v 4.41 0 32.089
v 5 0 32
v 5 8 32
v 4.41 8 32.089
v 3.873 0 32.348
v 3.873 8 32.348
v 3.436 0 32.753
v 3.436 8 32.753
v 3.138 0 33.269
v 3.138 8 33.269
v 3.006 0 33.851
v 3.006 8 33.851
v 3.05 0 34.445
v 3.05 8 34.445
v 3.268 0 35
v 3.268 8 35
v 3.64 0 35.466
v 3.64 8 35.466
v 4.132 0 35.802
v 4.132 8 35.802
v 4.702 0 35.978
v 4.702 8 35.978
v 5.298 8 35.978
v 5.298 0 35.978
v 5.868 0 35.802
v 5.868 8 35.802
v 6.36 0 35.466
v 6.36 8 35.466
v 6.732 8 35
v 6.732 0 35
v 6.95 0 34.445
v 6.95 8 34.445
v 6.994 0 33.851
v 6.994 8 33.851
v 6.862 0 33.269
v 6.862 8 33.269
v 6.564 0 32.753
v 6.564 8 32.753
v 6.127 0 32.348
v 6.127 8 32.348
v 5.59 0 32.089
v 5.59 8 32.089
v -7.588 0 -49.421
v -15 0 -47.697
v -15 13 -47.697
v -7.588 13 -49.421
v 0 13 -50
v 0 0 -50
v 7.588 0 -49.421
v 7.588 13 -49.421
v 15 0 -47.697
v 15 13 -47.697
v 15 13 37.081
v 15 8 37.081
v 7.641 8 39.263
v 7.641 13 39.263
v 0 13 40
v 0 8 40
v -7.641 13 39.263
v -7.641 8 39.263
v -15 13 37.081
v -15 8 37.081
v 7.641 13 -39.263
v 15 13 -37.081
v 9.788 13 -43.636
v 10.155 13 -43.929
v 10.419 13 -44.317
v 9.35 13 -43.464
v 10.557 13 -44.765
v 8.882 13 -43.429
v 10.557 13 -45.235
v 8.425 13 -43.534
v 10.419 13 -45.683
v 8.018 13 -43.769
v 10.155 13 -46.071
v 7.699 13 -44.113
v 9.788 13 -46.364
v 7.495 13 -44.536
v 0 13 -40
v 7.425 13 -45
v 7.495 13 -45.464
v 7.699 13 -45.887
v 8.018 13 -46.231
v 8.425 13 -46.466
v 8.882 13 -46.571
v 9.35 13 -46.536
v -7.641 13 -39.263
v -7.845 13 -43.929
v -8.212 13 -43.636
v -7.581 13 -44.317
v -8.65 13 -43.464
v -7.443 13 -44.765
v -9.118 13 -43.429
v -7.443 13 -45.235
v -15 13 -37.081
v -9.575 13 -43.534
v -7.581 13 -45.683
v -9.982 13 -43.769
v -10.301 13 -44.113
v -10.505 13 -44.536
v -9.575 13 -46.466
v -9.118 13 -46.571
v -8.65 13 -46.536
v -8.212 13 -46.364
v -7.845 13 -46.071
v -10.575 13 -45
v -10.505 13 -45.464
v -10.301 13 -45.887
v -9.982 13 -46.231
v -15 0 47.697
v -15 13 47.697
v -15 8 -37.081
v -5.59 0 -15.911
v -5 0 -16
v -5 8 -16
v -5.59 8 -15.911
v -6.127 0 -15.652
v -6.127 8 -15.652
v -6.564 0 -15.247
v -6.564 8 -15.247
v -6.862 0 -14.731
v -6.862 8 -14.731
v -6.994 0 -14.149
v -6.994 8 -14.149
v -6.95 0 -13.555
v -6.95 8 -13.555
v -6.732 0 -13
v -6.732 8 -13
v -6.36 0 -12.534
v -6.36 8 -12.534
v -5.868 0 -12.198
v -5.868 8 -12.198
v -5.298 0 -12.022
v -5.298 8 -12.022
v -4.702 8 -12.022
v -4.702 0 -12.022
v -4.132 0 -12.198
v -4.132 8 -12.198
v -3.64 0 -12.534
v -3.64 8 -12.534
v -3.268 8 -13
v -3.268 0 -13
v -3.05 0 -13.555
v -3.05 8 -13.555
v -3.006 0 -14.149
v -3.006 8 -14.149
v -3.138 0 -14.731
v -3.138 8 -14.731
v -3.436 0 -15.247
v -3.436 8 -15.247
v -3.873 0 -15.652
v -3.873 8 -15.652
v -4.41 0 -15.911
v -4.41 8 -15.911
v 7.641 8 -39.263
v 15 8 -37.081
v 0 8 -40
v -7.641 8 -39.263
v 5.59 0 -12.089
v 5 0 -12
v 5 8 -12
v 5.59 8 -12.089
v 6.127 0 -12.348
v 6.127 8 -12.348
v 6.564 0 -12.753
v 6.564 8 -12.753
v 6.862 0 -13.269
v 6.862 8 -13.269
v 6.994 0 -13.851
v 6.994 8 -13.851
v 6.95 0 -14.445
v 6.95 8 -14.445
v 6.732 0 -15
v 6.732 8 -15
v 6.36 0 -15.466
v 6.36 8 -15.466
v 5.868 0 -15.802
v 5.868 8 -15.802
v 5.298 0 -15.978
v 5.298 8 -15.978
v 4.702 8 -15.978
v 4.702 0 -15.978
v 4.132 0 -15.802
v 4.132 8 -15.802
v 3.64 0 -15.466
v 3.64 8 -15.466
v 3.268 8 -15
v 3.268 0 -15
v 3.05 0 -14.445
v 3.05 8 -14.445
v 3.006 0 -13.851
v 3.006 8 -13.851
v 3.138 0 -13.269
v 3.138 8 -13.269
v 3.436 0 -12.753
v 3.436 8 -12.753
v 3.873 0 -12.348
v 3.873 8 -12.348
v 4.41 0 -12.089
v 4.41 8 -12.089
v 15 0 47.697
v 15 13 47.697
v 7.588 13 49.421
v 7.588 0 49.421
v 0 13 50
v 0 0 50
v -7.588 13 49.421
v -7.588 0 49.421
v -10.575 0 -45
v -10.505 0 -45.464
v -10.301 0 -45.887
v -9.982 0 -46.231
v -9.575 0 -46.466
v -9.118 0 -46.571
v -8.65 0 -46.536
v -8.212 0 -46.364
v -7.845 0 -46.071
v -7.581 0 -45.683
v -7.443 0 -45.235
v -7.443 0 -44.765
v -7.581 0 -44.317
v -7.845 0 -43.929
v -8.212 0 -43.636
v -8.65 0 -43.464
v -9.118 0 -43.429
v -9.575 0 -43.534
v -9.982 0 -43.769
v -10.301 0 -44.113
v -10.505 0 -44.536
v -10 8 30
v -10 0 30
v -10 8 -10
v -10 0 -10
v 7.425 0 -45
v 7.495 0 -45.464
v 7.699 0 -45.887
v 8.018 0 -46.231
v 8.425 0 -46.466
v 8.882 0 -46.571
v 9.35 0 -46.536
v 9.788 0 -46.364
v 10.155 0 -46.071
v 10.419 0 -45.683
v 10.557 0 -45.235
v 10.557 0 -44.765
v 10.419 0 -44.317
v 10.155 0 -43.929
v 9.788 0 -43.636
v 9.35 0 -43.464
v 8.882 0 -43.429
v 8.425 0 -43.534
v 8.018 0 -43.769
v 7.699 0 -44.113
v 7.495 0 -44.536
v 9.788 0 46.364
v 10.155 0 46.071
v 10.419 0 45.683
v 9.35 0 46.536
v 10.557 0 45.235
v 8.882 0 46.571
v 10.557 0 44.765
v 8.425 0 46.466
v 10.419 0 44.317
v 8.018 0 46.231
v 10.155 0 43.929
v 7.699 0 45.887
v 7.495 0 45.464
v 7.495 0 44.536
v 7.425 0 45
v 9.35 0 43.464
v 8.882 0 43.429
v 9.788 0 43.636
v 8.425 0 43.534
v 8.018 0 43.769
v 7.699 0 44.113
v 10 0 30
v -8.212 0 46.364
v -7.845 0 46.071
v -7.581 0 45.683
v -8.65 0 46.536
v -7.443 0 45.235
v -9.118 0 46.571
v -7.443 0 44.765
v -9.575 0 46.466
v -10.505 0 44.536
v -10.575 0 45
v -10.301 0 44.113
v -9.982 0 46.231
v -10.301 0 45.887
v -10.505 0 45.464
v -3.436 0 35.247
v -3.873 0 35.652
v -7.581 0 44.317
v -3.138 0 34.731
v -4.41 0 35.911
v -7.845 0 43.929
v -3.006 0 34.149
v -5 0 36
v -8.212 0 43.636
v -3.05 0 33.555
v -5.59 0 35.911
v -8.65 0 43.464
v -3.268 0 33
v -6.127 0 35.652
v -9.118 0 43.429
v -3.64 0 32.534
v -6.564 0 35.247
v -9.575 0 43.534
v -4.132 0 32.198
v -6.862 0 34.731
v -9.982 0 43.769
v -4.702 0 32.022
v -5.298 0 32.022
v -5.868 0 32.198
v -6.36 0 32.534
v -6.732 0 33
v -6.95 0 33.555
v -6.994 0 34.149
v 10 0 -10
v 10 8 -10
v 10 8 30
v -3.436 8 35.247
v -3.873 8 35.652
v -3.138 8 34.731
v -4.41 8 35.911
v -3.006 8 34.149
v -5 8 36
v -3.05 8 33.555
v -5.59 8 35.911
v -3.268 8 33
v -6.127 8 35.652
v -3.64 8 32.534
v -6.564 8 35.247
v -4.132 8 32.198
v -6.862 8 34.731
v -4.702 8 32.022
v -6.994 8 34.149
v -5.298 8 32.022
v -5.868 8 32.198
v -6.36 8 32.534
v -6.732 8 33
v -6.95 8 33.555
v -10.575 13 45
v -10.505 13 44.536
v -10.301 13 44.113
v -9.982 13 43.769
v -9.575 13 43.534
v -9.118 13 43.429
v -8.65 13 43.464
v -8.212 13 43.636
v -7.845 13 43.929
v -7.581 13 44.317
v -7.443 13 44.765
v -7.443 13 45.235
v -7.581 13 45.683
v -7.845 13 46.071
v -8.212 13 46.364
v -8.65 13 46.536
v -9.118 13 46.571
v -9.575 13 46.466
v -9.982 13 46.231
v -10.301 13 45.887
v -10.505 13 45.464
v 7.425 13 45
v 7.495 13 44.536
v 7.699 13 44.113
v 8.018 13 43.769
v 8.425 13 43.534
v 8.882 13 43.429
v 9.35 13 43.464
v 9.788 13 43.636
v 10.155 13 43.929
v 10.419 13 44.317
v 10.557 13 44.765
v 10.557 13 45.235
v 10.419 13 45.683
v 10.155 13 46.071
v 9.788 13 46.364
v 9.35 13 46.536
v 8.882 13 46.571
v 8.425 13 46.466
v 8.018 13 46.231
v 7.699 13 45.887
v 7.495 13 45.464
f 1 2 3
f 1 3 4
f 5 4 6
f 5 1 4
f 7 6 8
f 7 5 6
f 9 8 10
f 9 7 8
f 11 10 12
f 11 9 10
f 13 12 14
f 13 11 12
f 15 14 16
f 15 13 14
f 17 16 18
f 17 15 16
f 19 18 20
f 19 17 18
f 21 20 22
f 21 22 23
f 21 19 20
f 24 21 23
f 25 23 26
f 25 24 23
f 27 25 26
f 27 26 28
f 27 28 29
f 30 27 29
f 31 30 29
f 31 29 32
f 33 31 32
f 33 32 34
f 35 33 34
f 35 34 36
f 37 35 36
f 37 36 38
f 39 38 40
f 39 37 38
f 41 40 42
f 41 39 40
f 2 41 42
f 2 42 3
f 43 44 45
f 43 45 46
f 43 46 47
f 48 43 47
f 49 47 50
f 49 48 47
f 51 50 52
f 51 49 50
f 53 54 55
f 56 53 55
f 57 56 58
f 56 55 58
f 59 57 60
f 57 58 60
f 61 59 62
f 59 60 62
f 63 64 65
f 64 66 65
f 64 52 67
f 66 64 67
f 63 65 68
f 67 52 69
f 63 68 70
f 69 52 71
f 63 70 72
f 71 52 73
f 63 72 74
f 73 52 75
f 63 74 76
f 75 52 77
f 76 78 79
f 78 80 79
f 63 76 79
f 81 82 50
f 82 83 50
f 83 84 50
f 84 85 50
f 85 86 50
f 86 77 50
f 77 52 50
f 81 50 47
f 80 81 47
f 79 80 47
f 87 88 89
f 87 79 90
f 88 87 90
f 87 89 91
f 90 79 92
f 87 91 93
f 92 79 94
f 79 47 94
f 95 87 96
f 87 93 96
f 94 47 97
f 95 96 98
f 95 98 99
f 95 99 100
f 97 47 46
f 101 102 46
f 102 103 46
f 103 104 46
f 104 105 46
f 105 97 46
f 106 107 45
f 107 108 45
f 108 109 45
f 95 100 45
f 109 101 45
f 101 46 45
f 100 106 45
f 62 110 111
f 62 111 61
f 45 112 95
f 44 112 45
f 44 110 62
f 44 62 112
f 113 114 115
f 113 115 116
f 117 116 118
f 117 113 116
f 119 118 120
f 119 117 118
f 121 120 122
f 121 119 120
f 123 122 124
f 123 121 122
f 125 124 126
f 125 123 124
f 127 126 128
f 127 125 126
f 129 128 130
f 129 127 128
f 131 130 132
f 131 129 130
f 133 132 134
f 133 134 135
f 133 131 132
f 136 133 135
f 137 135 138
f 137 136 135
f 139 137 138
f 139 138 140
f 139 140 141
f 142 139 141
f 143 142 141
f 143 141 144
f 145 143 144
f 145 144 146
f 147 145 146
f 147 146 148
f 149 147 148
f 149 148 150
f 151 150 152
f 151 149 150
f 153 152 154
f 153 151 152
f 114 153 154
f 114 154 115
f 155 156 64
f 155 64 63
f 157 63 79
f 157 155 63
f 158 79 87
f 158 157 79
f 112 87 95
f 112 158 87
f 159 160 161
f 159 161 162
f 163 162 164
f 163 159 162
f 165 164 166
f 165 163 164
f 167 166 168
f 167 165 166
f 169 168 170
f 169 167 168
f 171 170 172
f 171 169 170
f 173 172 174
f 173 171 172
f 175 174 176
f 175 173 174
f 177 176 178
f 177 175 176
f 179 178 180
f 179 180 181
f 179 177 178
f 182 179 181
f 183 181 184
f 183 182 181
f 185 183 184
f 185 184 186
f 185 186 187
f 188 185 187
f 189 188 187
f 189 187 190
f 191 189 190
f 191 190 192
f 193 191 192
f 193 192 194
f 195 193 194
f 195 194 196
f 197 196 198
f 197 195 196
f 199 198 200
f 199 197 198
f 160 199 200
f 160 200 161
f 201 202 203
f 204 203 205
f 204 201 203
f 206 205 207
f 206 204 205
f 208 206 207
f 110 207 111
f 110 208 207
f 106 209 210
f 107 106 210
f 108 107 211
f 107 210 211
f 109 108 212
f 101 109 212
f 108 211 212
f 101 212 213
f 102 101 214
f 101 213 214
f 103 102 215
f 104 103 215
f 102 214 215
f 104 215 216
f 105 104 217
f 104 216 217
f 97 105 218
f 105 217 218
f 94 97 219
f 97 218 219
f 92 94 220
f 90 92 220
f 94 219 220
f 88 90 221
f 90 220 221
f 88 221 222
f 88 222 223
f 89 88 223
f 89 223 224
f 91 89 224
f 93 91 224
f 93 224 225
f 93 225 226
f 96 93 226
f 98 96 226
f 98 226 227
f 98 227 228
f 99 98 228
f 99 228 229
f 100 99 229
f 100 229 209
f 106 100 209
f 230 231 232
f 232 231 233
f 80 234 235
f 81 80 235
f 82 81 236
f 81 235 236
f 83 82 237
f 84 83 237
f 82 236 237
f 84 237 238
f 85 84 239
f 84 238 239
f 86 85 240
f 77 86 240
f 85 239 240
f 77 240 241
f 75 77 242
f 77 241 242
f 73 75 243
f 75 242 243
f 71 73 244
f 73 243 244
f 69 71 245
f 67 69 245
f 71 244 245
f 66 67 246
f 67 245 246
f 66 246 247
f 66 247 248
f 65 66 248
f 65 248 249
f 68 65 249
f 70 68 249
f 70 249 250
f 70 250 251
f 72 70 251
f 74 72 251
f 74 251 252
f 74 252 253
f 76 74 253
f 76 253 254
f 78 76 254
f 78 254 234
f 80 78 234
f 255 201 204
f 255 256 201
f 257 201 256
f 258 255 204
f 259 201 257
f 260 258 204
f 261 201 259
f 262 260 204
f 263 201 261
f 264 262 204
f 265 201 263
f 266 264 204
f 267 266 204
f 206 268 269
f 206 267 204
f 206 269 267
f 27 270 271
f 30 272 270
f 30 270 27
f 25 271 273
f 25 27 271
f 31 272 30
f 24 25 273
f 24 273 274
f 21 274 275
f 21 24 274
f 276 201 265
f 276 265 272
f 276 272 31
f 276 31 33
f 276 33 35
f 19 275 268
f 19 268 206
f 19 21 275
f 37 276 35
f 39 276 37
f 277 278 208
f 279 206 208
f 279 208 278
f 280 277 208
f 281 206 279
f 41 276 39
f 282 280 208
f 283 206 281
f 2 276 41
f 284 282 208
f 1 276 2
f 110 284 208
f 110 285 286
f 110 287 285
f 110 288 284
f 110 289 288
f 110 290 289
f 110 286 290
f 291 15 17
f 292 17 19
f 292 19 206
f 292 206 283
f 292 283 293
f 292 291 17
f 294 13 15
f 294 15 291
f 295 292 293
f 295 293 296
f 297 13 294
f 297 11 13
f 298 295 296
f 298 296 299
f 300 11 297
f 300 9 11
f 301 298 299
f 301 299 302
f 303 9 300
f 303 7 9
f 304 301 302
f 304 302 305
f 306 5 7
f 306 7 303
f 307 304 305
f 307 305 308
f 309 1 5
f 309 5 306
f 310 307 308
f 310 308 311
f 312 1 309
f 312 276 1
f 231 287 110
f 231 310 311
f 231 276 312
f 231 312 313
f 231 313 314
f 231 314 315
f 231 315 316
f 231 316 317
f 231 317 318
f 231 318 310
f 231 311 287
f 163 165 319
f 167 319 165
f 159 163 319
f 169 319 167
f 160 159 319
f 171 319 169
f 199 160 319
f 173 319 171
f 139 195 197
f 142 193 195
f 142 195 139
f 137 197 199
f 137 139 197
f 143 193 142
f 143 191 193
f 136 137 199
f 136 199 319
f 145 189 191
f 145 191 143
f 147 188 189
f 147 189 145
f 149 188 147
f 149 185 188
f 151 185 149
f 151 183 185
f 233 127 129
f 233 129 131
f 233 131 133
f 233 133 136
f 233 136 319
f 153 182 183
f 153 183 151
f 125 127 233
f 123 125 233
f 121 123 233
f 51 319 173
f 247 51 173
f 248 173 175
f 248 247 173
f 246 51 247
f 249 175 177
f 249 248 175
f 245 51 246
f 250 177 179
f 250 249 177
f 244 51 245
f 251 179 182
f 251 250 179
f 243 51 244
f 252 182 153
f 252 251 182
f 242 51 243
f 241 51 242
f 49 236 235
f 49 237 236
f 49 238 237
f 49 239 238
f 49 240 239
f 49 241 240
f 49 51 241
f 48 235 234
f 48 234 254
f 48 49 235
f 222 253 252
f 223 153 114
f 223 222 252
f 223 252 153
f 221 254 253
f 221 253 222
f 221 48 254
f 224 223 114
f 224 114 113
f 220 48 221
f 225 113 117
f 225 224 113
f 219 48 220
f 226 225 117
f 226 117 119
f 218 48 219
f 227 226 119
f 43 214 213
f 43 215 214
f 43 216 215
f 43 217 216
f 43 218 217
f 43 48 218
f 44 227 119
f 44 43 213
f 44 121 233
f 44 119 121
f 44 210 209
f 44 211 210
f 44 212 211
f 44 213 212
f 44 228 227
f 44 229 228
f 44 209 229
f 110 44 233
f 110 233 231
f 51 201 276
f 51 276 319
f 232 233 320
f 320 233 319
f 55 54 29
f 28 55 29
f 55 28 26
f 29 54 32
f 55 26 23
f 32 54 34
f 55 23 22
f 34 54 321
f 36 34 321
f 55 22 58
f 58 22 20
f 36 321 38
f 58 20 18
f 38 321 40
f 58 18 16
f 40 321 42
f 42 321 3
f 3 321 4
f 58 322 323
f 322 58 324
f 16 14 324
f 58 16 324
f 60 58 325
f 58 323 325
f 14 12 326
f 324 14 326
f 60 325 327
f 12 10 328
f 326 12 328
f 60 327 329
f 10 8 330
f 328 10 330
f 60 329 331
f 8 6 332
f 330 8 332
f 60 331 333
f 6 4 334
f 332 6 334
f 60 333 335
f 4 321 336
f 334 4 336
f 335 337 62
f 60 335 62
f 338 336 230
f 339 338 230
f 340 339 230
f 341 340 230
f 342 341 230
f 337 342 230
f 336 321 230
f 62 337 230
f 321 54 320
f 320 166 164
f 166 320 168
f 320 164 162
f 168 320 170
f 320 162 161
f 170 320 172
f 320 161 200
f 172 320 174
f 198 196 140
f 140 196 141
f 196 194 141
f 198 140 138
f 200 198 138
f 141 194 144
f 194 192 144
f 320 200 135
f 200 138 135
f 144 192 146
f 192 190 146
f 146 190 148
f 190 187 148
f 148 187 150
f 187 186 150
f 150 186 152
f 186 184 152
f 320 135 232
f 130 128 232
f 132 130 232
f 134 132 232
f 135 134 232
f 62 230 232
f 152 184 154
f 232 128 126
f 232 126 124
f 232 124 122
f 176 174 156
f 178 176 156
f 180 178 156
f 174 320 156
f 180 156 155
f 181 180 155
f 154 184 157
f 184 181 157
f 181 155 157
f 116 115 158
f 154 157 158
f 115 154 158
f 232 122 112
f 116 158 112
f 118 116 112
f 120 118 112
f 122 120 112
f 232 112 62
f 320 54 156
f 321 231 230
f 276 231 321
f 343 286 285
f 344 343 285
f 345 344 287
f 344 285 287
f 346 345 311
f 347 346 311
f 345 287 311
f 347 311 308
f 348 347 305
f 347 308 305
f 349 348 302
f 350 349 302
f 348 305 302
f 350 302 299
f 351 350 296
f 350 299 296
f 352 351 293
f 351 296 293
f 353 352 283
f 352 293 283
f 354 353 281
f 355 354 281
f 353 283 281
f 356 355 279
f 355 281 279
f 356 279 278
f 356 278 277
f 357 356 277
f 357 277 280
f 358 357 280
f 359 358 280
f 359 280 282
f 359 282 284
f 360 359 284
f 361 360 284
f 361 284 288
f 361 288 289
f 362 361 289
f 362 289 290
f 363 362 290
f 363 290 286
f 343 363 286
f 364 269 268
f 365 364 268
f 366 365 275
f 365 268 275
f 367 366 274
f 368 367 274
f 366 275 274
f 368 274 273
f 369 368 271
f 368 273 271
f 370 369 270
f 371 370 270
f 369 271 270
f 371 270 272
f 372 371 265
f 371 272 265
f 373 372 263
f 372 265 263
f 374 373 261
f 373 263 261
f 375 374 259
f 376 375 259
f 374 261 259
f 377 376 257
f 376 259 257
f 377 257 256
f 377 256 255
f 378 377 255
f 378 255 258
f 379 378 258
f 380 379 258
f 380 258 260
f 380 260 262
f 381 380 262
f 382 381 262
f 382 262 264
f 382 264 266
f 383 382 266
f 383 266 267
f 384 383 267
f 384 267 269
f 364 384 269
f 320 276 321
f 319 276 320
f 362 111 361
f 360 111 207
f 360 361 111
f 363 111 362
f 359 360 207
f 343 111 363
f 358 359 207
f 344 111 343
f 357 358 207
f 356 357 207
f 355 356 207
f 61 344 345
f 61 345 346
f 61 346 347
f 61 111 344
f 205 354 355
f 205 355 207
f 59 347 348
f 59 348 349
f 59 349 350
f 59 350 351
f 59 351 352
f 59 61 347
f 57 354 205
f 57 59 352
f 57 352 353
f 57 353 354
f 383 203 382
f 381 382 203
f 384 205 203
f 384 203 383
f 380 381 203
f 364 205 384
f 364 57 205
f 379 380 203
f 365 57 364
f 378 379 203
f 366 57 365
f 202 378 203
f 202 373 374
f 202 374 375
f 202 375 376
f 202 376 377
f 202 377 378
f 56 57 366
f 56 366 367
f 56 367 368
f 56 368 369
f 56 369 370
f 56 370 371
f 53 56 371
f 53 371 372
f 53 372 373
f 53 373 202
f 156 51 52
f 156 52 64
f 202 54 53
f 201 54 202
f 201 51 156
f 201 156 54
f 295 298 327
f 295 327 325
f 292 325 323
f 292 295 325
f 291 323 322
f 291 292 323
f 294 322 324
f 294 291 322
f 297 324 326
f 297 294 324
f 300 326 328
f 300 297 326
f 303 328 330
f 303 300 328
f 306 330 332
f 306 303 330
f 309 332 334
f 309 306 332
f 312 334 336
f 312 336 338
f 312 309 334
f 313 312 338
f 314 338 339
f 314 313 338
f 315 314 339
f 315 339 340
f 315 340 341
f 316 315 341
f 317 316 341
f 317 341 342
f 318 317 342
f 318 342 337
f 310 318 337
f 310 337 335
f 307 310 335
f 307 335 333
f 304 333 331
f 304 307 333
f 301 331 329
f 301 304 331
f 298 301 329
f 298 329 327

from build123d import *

# Parameters (mm, degrees)
SKETCH_1_R                  = 2
SKETCH_1_W                  = 20
SKETCH_1_H                  = 40
EXTRUDE_1_DEPTH             = 8
EXTRUDE_2_DEPTH             = 5
HOLE_WIZARD_M31_D           = 3.15
PATTERN_LINEAR_1_COUNT      = 2
PATTERN_LINEAR_1_PITCH      = 18
PATTERN_LINEAR_1_COUNT_DIR2 = 2
PATTERN_LINEAR_1_PITCH_DIR2 = 90


with BuildPart() as part:
    # Эскиз1 → Бобышка-Вытянуть1 (new body)
    with BuildSketch(Plane(origin=(0, 0, 0), x_dir=(1, 0, 0), z_dir=(0, 1, 0))):
        with BuildLine():
            Line((-15, -47.696960071), (-15, 47.696960071))
            ThreePointArc((-15, 47.696960071), (0, 50), (15, 47.696960071))
            Line((15, 47.696960071), (15, -47.696960071))
            ThreePointArc((15, -47.696960071), (0, -50), (-15, -47.696960071))
        make_face()
        with Locations(Location((-5, -34, 0), (0, 0, 270))):
            Circle(SKETCH_1_R, mode=Mode.SUBTRACT)
        with Locations(Location((5, -34, 0), (0, 0, 90))):
            Circle(SKETCH_1_R, mode=Mode.SUBTRACT)
        with Locations(Location((5, 14, 0), (0, 0, 270))):
            Circle(SKETCH_1_R, mode=Mode.SUBTRACT)
        with Locations(Location((-5, 14, 0), (0, 0, 90))):
            Circle(SKETCH_1_R, mode=Mode.SUBTRACT)
        with Locations((0, -10)):
            Rectangle(SKETCH_1_W, SKETCH_1_H, mode=Mode.SUBTRACT)
    extrude(amount=EXTRUDE_1_DEPTH)

    # Эскиз2 → Бобышка-Вытянуть2 (add)
    with BuildSketch(Plane(origin=(0, 8, 0), x_dir=(1, 0, 0), z_dir=(0, 1, 0))):
        with BuildLine():
            Line((-15, 37.080992435), (-15, 47.696960071))
            ThreePointArc((-15, 47.696960071), (0, 50), (15, 47.696960071))
            Line((15, 47.696960071), (15, 37.080992435))
            ThreePointArc((15, 37.080992435), (0, 40), (-15, 37.080992435))
        make_face()
        with BuildLine():
            Line((-15, -37.080992435), (-15, -47.696960071))
            ThreePointArc((-15, -47.696960071), (0, -50), (15, -47.696960071))
            Line((15, -47.696960071), (15, -37.080992435))
            ThreePointArc((15, -37.080992435), (0, -40), (-15, -37.080992435))
        make_face()
    extrude(amount=EXTRUDE_2_DEPTH)

    # Сверло под метчик  спиральное M31 (through all)
    with Locations(Plane(origin=(0, 13, 0), x_dir=(1, 0, 0), z_dir=(0, 1, 0))):
        with Locations((-9, -45)):
            hole_wizard_m31 = Hole(HOLE_WIZARD_M31_D / 2)

    # Линейный массив1: Hole Wizard M31 2 × 2
    with Locations(*[(i * PATTERN_LINEAR_1_PITCH, 0, -j * PATTERN_LINEAR_1_PITCH_DIR2) for i in range(PATTERN_LINEAR_1_COUNT) for j in range(PATTERN_LINEAR_1_COUNT_DIR2) if (i, j) != (0, 0)]):
        add(hole_wizard_m31, mode=Mode.SUBTRACT)


solid = part.part
